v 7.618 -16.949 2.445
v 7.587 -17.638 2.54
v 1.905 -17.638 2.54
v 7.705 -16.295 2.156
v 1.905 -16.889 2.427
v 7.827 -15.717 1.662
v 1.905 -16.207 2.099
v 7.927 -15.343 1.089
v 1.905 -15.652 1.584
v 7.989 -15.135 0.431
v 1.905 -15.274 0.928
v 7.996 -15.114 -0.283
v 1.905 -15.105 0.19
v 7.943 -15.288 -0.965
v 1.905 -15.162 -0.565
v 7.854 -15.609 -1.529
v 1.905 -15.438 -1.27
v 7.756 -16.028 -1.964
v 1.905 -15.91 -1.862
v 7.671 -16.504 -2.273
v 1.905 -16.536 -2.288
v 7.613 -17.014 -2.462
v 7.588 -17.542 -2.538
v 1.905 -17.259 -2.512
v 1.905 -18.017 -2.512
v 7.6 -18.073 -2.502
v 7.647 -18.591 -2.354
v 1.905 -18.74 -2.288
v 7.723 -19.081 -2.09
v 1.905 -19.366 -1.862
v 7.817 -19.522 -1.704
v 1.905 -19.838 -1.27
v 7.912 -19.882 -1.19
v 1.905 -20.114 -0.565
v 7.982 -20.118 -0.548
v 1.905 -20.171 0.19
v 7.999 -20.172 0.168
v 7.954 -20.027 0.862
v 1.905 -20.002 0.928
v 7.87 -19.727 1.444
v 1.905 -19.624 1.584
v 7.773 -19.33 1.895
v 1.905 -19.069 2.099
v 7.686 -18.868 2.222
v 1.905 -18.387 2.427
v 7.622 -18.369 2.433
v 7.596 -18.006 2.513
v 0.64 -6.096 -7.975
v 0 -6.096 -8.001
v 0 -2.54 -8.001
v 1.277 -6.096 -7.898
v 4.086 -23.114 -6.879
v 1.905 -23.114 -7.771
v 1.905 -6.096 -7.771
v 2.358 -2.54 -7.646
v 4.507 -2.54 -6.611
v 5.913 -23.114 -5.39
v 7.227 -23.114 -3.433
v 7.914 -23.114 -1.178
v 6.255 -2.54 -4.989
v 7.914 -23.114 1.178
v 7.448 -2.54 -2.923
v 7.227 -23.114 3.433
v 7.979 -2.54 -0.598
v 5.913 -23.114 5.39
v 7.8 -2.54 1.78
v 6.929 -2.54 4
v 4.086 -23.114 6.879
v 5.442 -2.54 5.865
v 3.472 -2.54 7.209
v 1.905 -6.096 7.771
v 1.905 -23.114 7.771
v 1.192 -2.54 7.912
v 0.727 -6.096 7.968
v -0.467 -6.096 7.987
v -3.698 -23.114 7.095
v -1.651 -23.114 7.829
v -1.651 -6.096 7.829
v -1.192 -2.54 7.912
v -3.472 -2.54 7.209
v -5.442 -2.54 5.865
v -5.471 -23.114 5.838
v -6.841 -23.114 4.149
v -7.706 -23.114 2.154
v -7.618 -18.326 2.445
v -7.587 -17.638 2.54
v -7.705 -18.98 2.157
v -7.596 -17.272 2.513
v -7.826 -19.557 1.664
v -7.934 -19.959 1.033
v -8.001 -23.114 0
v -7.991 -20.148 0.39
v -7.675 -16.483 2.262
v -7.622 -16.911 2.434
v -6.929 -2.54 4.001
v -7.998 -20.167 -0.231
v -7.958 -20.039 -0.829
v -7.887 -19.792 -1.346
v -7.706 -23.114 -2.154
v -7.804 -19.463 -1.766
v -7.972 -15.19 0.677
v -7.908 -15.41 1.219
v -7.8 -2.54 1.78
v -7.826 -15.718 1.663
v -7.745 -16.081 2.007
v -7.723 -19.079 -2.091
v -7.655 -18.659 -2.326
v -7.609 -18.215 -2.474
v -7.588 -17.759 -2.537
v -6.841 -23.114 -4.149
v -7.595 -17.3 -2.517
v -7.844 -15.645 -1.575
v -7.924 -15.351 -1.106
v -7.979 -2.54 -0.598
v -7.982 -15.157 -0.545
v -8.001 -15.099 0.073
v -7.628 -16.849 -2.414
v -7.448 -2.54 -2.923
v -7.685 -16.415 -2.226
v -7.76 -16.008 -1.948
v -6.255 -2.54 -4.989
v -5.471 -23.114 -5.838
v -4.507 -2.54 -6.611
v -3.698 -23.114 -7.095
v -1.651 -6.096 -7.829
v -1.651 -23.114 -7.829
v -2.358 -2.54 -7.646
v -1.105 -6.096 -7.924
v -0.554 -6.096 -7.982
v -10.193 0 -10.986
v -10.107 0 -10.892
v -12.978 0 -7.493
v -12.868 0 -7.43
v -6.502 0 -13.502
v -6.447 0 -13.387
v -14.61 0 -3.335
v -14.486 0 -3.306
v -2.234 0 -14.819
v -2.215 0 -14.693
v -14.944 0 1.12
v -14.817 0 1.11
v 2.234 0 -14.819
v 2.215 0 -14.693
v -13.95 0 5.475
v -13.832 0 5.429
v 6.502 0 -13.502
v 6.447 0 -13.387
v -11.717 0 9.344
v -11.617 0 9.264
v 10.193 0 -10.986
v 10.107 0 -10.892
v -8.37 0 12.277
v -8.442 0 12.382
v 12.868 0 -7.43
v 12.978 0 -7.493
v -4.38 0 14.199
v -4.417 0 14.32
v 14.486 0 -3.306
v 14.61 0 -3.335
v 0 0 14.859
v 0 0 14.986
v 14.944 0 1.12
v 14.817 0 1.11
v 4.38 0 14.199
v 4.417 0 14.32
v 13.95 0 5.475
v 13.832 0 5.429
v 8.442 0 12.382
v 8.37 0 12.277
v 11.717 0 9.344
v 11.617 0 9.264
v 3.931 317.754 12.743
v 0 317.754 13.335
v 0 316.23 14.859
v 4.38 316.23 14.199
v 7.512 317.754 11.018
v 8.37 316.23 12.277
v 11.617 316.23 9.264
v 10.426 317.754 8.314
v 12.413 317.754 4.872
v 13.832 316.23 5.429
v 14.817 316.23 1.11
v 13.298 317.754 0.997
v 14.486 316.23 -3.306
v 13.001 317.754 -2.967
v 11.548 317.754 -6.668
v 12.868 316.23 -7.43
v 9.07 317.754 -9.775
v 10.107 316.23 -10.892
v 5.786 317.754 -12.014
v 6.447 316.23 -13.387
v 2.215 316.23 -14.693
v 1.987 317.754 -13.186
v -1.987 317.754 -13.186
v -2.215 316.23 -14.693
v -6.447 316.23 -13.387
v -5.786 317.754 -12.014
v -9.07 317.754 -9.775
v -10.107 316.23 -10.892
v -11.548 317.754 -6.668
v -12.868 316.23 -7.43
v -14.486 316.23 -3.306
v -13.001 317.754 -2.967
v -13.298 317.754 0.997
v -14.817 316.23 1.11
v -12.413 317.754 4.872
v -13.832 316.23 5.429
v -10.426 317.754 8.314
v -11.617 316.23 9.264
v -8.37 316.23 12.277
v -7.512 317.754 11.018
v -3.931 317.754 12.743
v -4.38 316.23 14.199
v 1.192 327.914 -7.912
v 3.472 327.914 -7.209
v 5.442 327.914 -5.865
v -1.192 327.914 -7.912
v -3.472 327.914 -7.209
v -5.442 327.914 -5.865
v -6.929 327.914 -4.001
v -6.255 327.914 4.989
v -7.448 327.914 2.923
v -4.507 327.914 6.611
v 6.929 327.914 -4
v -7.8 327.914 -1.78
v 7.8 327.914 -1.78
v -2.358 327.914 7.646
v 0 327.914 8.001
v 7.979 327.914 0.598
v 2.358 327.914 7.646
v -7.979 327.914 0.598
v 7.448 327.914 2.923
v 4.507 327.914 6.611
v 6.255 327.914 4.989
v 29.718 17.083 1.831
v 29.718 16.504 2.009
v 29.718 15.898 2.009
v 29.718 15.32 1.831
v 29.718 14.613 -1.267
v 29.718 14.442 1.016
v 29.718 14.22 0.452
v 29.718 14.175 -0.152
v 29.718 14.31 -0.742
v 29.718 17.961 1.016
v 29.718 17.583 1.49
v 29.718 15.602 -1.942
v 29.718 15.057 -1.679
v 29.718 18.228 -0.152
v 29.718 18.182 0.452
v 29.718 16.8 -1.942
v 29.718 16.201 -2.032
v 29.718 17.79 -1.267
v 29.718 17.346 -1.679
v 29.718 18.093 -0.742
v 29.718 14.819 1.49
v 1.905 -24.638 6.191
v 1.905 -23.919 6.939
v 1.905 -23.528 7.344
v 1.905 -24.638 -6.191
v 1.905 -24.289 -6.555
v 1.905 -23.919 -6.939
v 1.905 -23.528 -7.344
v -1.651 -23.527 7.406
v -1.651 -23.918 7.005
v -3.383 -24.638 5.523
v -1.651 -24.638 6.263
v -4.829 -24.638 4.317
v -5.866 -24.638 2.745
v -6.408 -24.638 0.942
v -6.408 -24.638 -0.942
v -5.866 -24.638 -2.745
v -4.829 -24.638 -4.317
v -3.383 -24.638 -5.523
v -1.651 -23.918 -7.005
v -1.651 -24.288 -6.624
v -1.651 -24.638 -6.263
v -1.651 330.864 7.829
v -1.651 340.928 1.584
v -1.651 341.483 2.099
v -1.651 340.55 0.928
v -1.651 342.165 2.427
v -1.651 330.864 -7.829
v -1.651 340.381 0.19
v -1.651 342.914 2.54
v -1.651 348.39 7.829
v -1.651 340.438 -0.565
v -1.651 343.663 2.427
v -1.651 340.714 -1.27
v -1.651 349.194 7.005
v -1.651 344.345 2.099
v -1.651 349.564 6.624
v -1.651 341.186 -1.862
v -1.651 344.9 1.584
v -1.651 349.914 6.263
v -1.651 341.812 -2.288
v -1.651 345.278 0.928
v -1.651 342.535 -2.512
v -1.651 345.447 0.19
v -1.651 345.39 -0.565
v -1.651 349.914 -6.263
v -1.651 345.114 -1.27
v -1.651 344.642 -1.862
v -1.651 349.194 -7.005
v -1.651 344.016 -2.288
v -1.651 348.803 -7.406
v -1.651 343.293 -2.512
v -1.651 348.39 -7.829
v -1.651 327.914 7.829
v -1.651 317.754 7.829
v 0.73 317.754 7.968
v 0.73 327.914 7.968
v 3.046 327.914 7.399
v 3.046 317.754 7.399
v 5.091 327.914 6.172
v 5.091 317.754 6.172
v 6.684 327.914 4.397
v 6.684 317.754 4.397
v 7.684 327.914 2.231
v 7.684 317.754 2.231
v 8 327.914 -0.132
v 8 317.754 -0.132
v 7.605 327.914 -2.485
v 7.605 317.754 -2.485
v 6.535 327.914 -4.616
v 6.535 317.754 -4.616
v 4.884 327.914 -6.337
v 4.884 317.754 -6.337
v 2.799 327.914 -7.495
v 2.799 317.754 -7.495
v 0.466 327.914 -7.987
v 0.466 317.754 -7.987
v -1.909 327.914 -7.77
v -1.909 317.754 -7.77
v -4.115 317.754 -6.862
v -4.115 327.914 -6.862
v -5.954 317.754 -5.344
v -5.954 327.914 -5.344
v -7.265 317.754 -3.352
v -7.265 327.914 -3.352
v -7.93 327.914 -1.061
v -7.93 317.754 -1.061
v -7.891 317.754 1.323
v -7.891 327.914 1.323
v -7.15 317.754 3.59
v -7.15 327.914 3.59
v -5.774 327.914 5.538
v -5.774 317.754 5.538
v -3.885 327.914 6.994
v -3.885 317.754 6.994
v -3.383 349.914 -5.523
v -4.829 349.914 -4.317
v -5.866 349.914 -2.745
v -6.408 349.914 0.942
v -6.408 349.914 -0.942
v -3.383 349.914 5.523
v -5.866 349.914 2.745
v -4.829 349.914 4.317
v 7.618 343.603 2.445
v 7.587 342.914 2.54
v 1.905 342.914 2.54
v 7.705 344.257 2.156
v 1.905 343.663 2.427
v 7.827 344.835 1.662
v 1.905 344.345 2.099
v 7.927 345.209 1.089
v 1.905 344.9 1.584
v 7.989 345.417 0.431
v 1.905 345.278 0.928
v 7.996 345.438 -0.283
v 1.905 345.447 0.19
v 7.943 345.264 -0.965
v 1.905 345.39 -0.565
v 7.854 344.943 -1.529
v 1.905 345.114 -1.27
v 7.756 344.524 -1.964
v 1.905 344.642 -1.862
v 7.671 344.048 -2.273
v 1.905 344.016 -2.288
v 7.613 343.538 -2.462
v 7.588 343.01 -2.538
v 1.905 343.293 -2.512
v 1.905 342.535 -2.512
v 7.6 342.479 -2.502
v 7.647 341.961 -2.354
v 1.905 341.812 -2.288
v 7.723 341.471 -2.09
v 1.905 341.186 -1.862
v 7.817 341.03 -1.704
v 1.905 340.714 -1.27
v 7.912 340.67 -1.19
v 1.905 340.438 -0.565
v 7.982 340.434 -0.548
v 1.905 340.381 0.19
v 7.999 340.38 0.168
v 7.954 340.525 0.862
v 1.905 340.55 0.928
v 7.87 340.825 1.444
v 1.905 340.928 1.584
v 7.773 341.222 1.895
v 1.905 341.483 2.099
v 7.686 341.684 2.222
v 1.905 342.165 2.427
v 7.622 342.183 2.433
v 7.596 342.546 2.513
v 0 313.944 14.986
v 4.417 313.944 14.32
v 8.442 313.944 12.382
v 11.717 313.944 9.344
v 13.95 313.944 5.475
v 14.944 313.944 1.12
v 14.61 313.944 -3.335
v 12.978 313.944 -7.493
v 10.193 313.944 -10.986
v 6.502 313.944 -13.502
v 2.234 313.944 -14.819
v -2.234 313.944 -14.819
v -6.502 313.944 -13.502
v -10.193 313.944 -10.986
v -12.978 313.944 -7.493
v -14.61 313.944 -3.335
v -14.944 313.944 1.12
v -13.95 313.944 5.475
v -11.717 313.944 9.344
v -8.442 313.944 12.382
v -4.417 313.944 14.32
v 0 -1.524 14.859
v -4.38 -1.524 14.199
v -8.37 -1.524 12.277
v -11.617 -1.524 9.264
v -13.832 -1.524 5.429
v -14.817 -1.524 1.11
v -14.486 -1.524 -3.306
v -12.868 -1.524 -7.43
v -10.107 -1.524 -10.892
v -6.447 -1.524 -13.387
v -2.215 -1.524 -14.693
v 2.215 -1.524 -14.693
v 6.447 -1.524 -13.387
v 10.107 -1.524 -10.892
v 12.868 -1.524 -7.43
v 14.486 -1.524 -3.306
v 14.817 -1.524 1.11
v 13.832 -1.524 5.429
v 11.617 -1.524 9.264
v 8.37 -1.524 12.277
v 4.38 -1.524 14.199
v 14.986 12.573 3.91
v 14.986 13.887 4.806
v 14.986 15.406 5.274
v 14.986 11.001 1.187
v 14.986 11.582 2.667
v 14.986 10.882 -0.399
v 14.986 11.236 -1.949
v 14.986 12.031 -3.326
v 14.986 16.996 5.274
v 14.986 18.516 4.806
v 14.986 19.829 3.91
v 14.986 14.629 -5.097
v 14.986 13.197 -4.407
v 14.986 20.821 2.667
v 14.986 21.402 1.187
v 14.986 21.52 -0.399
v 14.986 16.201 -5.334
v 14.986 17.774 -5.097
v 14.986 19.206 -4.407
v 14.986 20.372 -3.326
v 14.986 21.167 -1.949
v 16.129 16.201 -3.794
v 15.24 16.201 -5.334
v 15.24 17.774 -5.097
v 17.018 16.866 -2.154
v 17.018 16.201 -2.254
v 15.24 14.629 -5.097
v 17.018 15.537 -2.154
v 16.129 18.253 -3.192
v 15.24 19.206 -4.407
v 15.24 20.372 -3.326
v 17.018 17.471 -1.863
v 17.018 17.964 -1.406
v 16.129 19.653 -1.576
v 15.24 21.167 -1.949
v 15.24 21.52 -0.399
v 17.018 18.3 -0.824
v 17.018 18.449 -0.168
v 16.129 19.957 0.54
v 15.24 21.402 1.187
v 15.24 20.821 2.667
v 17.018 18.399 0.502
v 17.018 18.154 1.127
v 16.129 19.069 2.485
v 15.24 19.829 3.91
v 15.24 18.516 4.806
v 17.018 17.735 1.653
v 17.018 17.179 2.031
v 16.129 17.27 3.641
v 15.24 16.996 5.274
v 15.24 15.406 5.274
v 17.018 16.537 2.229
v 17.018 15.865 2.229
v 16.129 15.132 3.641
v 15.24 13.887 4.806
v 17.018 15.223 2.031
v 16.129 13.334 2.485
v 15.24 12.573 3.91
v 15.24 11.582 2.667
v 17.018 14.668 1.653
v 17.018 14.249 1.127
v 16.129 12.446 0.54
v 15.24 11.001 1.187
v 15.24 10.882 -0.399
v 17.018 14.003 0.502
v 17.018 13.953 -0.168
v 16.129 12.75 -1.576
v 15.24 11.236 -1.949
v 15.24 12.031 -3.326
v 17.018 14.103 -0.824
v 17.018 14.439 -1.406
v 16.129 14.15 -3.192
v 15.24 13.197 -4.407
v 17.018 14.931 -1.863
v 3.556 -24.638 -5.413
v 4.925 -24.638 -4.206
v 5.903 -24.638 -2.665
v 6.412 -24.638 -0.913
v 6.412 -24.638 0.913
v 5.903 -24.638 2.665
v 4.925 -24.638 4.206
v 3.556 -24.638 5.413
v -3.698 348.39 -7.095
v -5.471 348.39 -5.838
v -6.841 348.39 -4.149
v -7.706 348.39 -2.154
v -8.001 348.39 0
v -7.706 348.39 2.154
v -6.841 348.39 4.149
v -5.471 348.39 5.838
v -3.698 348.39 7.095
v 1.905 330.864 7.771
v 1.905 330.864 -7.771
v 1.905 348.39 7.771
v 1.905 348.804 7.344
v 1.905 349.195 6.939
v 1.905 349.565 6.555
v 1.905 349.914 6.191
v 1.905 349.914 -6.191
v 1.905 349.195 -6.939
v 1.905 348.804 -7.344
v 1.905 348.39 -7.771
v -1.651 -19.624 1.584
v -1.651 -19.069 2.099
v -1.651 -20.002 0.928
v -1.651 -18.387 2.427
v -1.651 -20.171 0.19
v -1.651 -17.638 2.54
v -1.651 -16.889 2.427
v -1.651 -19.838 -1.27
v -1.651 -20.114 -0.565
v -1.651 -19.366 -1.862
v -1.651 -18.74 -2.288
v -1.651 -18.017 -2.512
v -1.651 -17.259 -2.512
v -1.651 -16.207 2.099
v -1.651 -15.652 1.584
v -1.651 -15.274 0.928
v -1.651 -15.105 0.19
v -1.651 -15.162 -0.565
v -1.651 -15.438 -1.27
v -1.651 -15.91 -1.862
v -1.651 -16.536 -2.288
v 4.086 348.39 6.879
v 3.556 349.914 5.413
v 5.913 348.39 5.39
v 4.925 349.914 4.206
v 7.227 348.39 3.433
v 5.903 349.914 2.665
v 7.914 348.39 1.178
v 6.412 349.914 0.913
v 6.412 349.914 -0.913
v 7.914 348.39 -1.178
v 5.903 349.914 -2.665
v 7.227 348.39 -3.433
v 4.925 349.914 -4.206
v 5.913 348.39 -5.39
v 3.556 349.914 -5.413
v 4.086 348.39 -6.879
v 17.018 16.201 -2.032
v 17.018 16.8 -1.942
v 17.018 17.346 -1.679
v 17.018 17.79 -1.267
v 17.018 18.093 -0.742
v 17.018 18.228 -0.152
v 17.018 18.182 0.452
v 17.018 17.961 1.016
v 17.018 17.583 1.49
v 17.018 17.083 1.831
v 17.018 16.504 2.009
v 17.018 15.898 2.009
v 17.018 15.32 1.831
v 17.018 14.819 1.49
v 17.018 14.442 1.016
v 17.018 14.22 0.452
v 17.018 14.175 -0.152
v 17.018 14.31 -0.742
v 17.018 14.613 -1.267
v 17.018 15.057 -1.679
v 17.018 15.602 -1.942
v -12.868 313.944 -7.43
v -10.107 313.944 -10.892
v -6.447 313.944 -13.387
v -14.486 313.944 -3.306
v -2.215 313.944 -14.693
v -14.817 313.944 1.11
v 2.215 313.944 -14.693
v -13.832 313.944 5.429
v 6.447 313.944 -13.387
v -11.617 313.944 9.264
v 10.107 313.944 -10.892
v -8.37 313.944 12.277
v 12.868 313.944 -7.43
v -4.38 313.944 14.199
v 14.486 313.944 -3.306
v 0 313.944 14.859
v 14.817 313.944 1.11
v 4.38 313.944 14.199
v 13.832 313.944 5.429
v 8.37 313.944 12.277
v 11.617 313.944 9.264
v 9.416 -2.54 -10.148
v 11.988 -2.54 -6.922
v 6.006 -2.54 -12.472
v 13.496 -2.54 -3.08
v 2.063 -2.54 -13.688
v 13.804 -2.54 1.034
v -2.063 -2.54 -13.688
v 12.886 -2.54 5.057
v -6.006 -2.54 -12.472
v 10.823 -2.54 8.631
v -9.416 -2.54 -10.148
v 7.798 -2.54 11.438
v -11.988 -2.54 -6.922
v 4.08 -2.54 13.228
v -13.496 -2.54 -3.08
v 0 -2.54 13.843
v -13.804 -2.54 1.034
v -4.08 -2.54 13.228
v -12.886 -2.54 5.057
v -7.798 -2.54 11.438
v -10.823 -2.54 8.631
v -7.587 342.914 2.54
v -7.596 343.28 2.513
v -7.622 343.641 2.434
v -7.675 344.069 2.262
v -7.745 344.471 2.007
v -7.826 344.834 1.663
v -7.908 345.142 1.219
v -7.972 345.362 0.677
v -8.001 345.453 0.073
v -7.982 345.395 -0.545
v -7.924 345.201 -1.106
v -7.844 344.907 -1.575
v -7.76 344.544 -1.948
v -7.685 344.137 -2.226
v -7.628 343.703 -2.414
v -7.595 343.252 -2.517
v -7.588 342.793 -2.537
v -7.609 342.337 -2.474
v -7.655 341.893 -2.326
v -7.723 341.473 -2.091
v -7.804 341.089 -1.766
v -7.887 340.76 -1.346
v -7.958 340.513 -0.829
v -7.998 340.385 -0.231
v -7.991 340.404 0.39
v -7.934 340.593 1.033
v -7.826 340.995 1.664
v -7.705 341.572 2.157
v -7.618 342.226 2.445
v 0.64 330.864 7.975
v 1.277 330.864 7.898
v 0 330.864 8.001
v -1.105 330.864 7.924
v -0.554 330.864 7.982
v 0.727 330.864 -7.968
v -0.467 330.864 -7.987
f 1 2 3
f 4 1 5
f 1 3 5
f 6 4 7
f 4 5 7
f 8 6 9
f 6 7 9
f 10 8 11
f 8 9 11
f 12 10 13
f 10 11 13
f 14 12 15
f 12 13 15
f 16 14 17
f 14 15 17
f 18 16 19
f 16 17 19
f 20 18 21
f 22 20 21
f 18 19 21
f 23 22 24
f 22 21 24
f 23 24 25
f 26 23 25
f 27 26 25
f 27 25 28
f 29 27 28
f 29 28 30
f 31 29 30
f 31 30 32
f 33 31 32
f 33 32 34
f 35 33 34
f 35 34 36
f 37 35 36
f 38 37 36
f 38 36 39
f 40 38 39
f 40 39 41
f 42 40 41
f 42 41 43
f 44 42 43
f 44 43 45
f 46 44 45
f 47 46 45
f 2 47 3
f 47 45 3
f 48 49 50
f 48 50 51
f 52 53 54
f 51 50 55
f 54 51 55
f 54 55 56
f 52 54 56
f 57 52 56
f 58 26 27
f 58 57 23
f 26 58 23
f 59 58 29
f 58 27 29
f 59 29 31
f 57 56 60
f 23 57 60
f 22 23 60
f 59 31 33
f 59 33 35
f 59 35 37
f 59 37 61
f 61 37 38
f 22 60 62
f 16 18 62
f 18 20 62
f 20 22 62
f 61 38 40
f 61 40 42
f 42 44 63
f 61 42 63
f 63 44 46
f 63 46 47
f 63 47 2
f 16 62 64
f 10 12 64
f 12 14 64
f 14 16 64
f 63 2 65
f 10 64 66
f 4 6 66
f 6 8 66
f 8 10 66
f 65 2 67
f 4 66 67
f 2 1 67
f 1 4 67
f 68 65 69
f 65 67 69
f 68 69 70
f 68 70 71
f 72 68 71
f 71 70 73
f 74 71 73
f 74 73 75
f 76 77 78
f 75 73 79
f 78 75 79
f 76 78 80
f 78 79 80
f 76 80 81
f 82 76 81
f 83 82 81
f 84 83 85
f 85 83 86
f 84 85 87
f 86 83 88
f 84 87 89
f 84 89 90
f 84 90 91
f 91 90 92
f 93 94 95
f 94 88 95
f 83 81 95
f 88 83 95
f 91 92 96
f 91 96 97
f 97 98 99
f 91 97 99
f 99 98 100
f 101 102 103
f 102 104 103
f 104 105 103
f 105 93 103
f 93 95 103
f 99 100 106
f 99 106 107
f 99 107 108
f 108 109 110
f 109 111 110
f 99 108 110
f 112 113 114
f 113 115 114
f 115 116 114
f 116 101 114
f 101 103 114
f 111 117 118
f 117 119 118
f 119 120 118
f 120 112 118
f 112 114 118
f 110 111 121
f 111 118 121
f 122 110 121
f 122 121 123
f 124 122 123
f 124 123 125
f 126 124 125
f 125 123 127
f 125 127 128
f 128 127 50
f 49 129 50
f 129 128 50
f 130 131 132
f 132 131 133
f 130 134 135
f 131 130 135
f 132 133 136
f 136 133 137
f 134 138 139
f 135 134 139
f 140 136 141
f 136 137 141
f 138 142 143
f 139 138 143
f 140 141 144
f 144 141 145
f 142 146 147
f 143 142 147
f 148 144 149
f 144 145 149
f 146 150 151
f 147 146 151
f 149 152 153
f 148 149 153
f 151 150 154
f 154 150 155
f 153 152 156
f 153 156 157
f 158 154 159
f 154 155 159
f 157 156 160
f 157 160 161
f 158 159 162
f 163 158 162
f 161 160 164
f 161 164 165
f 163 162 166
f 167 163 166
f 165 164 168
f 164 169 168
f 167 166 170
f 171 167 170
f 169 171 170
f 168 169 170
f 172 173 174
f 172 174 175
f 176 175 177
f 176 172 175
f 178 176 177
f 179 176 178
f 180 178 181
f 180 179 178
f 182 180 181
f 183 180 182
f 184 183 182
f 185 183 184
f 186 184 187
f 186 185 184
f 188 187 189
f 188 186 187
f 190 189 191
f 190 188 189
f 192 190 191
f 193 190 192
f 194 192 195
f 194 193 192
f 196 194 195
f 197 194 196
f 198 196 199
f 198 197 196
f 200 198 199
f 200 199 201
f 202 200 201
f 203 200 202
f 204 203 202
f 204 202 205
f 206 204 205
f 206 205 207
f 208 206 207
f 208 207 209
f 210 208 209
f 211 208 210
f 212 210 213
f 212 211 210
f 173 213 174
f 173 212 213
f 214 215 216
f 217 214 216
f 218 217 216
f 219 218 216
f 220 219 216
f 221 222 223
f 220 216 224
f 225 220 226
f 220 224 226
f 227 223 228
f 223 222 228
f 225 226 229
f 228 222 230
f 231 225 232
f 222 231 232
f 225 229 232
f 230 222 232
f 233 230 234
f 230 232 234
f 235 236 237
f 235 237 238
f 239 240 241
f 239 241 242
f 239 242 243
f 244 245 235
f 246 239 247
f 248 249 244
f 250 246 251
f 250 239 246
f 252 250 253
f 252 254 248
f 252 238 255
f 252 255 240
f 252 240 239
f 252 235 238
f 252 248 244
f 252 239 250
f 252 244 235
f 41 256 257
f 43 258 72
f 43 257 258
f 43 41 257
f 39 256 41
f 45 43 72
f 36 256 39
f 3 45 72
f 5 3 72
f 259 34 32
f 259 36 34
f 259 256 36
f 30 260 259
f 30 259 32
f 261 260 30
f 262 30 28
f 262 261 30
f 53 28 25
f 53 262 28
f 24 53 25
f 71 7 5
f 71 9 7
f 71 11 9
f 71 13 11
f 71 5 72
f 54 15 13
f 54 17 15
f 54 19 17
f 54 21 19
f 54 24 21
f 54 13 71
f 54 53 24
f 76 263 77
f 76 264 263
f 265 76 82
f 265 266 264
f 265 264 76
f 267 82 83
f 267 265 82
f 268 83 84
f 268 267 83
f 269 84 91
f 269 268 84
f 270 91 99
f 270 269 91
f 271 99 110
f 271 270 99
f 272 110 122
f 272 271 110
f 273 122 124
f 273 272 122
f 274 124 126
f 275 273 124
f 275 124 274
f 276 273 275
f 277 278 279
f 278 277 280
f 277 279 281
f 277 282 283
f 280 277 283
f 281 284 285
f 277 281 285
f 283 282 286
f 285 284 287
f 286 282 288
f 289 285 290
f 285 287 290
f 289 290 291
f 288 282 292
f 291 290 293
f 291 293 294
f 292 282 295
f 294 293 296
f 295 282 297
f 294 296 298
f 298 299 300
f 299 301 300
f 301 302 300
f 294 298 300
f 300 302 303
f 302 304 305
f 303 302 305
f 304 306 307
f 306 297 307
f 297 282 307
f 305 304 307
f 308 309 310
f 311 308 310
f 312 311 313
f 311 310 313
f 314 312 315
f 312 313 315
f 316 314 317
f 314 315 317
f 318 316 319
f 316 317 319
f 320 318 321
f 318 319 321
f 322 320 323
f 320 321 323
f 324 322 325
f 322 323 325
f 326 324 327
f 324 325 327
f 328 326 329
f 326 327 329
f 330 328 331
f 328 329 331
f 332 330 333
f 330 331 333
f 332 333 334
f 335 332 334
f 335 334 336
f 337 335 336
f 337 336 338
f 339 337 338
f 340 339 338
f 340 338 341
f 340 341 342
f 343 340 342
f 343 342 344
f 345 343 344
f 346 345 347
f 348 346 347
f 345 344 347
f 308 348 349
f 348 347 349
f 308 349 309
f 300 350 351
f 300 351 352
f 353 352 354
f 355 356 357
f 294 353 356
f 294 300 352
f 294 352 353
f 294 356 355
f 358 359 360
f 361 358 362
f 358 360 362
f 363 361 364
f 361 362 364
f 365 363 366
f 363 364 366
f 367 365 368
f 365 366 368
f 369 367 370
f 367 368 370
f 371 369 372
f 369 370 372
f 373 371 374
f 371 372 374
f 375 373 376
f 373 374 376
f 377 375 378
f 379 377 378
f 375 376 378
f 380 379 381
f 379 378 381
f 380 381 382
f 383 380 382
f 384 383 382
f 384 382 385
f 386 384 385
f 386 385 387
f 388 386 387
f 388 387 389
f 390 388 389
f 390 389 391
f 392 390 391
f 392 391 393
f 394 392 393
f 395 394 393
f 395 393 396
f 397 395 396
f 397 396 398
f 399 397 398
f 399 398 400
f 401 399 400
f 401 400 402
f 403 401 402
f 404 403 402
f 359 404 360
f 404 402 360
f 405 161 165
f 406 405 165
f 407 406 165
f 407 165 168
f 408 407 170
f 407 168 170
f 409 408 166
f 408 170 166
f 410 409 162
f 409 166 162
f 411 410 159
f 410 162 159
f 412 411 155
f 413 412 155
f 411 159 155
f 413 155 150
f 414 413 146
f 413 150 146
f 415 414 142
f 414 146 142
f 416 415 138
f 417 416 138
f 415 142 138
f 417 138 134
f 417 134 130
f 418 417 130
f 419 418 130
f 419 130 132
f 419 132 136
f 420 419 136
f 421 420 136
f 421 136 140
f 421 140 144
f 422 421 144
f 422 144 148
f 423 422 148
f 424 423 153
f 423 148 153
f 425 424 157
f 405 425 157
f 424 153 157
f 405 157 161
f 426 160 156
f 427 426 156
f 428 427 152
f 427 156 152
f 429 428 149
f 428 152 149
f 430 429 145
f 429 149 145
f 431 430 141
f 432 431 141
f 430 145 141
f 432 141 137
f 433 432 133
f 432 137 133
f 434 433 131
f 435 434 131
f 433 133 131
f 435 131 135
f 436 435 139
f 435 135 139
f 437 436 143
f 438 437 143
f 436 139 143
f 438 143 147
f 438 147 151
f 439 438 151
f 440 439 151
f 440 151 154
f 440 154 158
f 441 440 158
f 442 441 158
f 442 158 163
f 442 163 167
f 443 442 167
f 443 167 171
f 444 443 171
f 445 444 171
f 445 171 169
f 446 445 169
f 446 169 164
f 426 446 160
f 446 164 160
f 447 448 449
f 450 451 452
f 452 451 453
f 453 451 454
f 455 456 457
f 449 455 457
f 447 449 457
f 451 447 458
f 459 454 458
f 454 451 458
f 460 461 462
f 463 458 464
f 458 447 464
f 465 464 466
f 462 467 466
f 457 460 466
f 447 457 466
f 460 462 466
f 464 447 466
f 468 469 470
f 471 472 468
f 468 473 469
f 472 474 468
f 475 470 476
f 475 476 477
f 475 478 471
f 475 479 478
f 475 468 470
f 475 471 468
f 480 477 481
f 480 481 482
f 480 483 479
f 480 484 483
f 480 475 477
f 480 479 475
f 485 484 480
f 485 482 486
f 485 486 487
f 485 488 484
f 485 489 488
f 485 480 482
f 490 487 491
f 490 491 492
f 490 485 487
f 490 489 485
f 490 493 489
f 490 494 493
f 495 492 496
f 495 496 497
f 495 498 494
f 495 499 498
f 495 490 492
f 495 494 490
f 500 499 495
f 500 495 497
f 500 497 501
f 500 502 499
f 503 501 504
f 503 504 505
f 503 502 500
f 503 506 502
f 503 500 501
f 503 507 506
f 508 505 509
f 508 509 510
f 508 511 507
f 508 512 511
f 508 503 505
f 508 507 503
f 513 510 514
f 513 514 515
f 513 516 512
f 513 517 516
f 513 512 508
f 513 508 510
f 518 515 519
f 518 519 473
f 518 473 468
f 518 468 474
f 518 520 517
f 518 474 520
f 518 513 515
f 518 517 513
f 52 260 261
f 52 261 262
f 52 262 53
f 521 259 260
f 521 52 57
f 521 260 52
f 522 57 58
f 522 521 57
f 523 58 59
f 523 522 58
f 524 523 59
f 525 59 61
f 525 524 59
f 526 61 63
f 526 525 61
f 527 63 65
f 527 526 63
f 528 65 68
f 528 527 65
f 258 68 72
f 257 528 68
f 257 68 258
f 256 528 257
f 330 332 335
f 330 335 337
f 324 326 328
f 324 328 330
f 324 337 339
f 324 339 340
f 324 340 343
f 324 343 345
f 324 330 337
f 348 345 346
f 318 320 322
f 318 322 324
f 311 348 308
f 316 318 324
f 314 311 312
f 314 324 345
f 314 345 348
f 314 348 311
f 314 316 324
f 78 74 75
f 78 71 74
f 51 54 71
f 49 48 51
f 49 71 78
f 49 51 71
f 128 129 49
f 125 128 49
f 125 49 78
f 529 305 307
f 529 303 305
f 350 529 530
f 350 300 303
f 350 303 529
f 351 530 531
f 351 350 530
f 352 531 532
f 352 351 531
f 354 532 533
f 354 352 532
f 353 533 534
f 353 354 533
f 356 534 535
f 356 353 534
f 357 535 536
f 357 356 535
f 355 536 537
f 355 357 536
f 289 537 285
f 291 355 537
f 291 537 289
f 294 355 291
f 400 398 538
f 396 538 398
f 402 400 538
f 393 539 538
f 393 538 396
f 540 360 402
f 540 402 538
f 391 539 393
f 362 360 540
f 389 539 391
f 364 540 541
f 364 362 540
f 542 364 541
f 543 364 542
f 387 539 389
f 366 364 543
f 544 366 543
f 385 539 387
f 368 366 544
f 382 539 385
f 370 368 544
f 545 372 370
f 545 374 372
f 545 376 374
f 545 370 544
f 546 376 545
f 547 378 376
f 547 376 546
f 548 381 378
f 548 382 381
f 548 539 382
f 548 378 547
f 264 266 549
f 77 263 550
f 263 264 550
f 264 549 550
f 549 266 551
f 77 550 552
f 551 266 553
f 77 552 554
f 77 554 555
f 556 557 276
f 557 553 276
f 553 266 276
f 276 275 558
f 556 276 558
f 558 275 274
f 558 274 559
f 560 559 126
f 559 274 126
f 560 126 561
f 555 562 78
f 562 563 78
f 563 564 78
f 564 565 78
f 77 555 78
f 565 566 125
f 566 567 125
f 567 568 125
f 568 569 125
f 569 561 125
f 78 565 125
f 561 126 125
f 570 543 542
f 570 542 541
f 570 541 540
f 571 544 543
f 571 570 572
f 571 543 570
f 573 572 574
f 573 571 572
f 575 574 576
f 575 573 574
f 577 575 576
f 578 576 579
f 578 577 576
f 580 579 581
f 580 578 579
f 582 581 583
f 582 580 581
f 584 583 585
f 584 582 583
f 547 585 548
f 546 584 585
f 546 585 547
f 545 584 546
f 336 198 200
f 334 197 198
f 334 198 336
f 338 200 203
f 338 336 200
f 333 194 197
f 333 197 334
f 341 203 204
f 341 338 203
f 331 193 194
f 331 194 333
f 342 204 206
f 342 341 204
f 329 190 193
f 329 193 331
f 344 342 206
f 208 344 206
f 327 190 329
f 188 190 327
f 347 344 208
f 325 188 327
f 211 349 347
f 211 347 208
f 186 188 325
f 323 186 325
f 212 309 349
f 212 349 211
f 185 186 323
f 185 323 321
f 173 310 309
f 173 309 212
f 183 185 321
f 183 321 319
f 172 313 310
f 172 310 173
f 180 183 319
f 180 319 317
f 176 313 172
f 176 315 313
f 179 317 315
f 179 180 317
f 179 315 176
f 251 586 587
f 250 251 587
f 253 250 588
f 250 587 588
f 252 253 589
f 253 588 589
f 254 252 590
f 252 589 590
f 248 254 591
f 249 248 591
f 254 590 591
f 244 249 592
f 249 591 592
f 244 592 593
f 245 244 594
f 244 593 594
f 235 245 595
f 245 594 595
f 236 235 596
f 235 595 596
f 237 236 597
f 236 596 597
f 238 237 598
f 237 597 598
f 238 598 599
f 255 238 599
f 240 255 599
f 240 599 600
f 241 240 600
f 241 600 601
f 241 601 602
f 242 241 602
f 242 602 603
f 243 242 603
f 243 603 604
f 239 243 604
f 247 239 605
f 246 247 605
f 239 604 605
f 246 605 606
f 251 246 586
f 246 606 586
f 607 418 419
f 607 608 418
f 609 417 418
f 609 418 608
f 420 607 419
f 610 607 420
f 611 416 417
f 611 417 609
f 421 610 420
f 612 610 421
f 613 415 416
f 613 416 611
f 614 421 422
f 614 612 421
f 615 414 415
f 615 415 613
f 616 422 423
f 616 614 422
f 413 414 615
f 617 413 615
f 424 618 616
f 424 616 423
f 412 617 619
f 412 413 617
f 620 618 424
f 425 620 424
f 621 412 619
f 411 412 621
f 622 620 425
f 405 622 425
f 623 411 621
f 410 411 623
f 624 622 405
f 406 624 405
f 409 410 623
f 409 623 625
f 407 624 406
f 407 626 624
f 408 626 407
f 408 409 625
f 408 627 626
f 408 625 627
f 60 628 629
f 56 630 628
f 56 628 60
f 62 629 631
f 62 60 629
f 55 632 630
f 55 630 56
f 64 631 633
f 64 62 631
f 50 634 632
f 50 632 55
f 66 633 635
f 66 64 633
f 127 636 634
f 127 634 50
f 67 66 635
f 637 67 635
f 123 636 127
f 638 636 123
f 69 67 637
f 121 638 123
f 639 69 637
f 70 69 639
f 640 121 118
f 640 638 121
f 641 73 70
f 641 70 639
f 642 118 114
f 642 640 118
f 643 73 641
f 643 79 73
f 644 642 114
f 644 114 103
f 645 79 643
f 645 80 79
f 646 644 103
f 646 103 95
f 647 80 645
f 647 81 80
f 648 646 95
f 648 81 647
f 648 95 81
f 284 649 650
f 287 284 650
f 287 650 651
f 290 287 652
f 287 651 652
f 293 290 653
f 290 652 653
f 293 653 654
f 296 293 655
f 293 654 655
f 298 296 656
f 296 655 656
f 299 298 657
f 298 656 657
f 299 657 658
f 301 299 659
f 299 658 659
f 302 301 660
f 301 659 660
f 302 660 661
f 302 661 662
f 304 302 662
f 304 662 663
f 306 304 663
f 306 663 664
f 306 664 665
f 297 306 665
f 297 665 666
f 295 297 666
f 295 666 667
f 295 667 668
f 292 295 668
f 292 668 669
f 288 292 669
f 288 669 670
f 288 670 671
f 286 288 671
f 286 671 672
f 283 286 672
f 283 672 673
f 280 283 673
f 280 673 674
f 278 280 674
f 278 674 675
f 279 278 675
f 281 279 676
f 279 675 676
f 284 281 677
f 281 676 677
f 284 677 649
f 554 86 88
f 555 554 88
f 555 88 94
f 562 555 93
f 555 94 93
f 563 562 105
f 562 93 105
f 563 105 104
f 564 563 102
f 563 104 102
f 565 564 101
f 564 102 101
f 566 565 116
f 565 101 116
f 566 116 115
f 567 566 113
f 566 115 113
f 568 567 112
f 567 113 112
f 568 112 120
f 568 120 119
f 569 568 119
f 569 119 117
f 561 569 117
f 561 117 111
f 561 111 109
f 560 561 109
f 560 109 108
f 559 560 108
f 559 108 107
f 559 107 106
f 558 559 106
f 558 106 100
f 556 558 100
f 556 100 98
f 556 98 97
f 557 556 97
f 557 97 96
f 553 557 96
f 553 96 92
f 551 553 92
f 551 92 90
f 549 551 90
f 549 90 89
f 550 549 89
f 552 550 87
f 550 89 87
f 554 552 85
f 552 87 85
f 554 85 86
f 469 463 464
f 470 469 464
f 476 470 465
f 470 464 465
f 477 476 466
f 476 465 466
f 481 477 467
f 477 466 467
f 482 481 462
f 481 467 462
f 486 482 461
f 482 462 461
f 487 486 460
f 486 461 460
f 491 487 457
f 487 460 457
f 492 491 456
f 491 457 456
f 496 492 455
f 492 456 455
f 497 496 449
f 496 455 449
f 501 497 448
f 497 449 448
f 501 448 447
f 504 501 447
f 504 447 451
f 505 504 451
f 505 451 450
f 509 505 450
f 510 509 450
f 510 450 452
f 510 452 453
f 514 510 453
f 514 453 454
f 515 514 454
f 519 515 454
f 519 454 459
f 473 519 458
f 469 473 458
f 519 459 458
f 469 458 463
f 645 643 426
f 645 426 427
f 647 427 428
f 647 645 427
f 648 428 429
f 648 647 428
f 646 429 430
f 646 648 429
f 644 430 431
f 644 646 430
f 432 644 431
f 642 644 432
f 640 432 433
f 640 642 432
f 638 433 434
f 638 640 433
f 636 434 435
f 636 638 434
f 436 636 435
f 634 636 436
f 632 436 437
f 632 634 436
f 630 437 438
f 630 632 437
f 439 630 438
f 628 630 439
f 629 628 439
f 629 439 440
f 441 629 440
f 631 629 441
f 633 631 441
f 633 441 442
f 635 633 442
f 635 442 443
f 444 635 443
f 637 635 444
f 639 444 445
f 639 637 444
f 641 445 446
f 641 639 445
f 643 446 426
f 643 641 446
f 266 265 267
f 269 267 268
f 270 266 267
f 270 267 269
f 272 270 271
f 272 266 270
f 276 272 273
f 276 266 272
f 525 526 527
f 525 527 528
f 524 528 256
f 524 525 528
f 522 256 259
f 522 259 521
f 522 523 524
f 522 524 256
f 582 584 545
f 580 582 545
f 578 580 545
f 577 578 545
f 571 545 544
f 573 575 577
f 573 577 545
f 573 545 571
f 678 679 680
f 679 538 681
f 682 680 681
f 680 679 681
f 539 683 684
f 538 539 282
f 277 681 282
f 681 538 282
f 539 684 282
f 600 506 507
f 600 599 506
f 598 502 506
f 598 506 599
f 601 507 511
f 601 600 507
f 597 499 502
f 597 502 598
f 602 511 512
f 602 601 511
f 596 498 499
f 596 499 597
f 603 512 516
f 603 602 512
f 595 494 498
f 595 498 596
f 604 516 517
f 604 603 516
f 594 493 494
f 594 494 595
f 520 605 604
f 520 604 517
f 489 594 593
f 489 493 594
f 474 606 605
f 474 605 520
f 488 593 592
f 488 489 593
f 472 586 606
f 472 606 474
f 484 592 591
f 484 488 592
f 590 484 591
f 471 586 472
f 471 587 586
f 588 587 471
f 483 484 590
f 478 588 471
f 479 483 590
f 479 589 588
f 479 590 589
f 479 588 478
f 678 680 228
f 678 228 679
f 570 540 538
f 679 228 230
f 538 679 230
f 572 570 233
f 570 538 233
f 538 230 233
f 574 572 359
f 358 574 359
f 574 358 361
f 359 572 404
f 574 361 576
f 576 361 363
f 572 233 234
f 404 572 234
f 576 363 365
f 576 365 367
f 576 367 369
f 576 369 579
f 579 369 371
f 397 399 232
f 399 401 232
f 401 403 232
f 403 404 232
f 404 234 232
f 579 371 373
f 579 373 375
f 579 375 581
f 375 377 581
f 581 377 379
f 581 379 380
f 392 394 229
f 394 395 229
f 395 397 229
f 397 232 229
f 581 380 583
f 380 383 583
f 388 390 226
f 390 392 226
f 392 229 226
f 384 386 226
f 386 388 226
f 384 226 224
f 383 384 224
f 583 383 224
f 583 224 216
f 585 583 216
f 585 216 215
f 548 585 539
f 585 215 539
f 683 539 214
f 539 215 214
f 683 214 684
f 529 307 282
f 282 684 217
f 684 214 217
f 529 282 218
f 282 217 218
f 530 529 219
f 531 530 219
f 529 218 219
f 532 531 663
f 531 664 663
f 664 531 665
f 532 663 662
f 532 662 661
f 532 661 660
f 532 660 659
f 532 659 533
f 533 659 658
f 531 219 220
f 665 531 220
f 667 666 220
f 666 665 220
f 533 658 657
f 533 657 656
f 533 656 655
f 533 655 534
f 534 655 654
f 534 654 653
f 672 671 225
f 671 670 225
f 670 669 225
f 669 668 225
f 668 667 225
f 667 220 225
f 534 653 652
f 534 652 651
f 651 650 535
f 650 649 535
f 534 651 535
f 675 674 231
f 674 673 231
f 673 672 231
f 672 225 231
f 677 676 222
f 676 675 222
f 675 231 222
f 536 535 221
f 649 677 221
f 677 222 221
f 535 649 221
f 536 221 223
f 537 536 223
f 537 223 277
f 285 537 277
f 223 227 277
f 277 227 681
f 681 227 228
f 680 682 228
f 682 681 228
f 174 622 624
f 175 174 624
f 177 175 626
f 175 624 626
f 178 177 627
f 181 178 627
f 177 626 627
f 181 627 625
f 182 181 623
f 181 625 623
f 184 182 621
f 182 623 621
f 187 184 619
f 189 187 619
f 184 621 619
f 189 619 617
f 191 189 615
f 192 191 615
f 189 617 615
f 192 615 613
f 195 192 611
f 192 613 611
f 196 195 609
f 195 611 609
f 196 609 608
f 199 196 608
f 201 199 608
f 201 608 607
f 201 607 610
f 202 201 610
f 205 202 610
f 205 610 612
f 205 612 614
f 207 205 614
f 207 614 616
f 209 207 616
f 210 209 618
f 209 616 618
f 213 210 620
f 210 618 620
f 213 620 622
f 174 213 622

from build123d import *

# Parameters (mm, degrees)
SKETCH1_R           = 14.986
BOSS_EXTRUDE1_DEPTH = 313.944
SKETCH2_R           = 14.859
BOSS_EXTRUDE2_DEPTH = 2.54
CHAMFER1_SIZE       = 1.016
SKETCH3_R           = 8.001
BOSS_EXTRUDE3_DEPTH = 22.098
CHAMFER2_SIZE       = 1.524
SKETCH4_R           = 2.54
CUT_EXTRUDE1_DEPTH  = 21.59
SKETCH5_W           = 3.556
SKETCH5_H           = 22.881169146
CUT_EXTRUDE2_DEPTH  = 21.59
SKETCH6_R           = 5.334
BOSS_EXTRUDE4_DEPTH = 2.032
CHAMFER3_SIZE       = 1.778
CHAMFER3_SIZE2      = 3.079586336
SKETCH7_R           = 2.032
BOSS_EXTRUDE5_DEPTH = 12.7
SKETCH8_R           = 14.859
BOSS_EXTRUDE6_DEPTH = 3.81
CHAMFER4_SIZE       = 1.524
SKETCH9_R           = 8.001
BOSS_EXTRUDE7_DEPTH = 10.16
SKETCH10_R          = 8.001
BOSS_EXTRUDE8_DEPTH = 22
CHAMFER5_SIZE       = 1.524
SKETCH11_R          = 2.54
CUT_EXTRUDE3_DEPTH  = 21.844
SKETCH12_W          = 3.556
SKETCH12_H          = 19.05
CUT_EXTRUDE4_DEPTH  = 21.844


with BuildPart() as part:
    # Sketch1 → Boss-Extrude1 (new body)
    with BuildSketch(Plane(origin=(0, 0, 0), x_dir=(1, 0, 0), z_dir=(0, 1, 0))):
        with Locations(Location((0, 0, 0), (0, 0, 270))):  # turned: the seam where the file's is
            Circle(SKETCH1_R)
    extrude(amount=BOSS_EXTRUDE1_DEPTH)

    # Sketch2 → Boss-Extrude2 (add)
    with BuildSketch(Plane.XZ):
        with Locations(Location((0, 0, 0), (0, 0, 90))):  # turned: the seam where the file's is
            Circle(SKETCH2_R)
    extrude(amount=BOSS_EXTRUDE2_DEPTH)

    # Chamfer1
    chamfer1_edges = [part.edges().sort_by_distance(p)[0] for p in [
        (0, -2.54, -14.859),
    ]]
    chamfer(chamfer1_edges, length=CHAMFER1_SIZE)

    # Sketch3 → Boss-Extrude3 (add)
    with BuildSketch(Plane.XZ.offset(2.54)):
        with Locations(Location((0, 0, 0), (0, 0, 270))):  # turned: the seam where the file's is
            Circle(SKETCH3_R)
    extrude(amount=BOSS_EXTRUDE3_DEPTH)

    # Chamfer2
    chamfer2_edges = [part.edges().sort_by_distance(p)[0] for p in [
        (0, -24.638, 8.001),
    ]]
    chamfer(chamfer2_edges, length=CHAMFER2_SIZE)

    # Sketch4 → Cut-Extrude1 (cut)
    with BuildSketch(Plane.ZY.offset(8.001)):
        with Locations((0, -17.638)):
            Circle(SKETCH4_R)
    extrude(amount=-CUT_EXTRUDE1_DEPTH, mode=Mode.SUBTRACT)

    # Sketch5 → Cut-Extrude2 (cut)
    with BuildSketch(Plane(origin=(0, 0, -8.001), x_dir=(-1, 0, 0), z_dir=(0, 0, -1))):
        with Locations((-0.127, -17.536584573)):
            Rectangle(SKETCH5_W, SKETCH5_H)
    extrude(amount=-CUT_EXTRUDE2_DEPTH, mode=Mode.SUBTRACT)

    # Sketch8 → Boss-Extrude6 (add)
    with BuildSketch(Plane(origin=(0, 313.944, 0), x_dir=(1, 0, 0), z_dir=(0, 1, 0))):
        with Locations(Location((0, 0, 0), (0, 0, 270))):  # turned: the seam where the file's is
            Circle(SKETCH8_R)
    extrude(amount=BOSS_EXTRUDE6_DEPTH)

    # Chamfer4
    chamfer4_edges = [part.edges().sort_by_distance(p)[0] for p in [
        (0, 317.754, -14.859),
    ]]
    chamfer(chamfer4_edges, length=CHAMFER4_SIZE)

    # Sketch9 → Boss-Extrude7 (add)
    with BuildSketch(Plane(origin=(0, 317.754, 0), x_dir=(1, 0, 0), z_dir=(0, 1, 0))):
        with Locations(Location((0, 0, 0), (0, 0, 258.091508286))):  # turned: the seam where the file's is
            Circle(SKETCH9_R)
    extrude(amount=BOSS_EXTRUDE7_DEPTH)


with BuildPart() as body_2:
    # Sketch6 → Boss-Extrude4 (new body)
    with BuildSketch(Plane(origin=(14.986, 0, 0), x_dir=(0, 0, -1), z_dir=(1, 0, 0))):
        with Locations((0, 16.201300922)):
            Circle(SKETCH6_R)
    extrude(amount=BOSS_EXTRUDE4_DEPTH)

    # Chamfer3
    chamfer3_edges = [body_2.edges().sort_by_distance(p)[0] for p in [
        (17.018, 16.201300922, 5.334),
    ]]
    chamfer3_side = [body_2.faces().sort_by_distance(p)[0] for p in [
        (16.002, 16.201300922, 5.334),
    ]]
    chamfer(chamfer3_edges, length=CHAMFER3_SIZE, length2=CHAMFER3_SIZE2, reference=chamfer3_side[0])

    # Sketch7 → Boss-Extrude5 (add)
    with BuildSketch(Plane(origin=(17.018, 0, 0), x_dir=(0, 0, -1), z_dir=(1, 0, 0))):
        with Locations((0, 16.201300922)):
            Circle(SKETCH7_R)
    extrude(amount=BOSS_EXTRUDE5_DEPTH)


with BuildPart() as body_3:
    # Sketch10 → Boss-Extrude8 (new body)
    with BuildSketch(Plane(origin=(0, 327.914, 0), x_dir=(1, 0, 0), z_dir=(0, 1, 0))):
        with Locations(Location((0, 0, 0), (0, 0, 270))):  # turned: the seam where the file's is
            Circle(SKETCH10_R)
    extrude(amount=BOSS_EXTRUDE8_DEPTH)

    # Chamfer5
    chamfer5_edges = [body_3.edges().sort_by_distance(p)[0] for p in [
        (0, 349.914, -8.001),
    ]]
    chamfer(chamfer5_edges, length=CHAMFER5_SIZE)

    # Sketch11 → Cut-Extrude3 (cut)
    with BuildSketch(Plane.ZY.offset(8.001)):
        with Locations((0, 342.914)):
            Circle(SKETCH11_R)
    extrude(amount=-CUT_EXTRUDE3_DEPTH, mode=Mode.SUBTRACT)

    # Sketch12 → Cut-Extrude4 (cut)
    with BuildSketch(Plane(origin=(0, 0, -8.001), x_dir=(-1, 0, 0), z_dir=(0, 0, -1))):
        with Locations((-0.127, 340.389)):
            Rectangle(SKETCH12_W, SKETCH12_H)
    extrude(amount=-CUT_EXTRUDE4_DEPTH, mode=Mode.SUBTRACT)


solid = Compound([part.part, body_2.part, body_3.part])
